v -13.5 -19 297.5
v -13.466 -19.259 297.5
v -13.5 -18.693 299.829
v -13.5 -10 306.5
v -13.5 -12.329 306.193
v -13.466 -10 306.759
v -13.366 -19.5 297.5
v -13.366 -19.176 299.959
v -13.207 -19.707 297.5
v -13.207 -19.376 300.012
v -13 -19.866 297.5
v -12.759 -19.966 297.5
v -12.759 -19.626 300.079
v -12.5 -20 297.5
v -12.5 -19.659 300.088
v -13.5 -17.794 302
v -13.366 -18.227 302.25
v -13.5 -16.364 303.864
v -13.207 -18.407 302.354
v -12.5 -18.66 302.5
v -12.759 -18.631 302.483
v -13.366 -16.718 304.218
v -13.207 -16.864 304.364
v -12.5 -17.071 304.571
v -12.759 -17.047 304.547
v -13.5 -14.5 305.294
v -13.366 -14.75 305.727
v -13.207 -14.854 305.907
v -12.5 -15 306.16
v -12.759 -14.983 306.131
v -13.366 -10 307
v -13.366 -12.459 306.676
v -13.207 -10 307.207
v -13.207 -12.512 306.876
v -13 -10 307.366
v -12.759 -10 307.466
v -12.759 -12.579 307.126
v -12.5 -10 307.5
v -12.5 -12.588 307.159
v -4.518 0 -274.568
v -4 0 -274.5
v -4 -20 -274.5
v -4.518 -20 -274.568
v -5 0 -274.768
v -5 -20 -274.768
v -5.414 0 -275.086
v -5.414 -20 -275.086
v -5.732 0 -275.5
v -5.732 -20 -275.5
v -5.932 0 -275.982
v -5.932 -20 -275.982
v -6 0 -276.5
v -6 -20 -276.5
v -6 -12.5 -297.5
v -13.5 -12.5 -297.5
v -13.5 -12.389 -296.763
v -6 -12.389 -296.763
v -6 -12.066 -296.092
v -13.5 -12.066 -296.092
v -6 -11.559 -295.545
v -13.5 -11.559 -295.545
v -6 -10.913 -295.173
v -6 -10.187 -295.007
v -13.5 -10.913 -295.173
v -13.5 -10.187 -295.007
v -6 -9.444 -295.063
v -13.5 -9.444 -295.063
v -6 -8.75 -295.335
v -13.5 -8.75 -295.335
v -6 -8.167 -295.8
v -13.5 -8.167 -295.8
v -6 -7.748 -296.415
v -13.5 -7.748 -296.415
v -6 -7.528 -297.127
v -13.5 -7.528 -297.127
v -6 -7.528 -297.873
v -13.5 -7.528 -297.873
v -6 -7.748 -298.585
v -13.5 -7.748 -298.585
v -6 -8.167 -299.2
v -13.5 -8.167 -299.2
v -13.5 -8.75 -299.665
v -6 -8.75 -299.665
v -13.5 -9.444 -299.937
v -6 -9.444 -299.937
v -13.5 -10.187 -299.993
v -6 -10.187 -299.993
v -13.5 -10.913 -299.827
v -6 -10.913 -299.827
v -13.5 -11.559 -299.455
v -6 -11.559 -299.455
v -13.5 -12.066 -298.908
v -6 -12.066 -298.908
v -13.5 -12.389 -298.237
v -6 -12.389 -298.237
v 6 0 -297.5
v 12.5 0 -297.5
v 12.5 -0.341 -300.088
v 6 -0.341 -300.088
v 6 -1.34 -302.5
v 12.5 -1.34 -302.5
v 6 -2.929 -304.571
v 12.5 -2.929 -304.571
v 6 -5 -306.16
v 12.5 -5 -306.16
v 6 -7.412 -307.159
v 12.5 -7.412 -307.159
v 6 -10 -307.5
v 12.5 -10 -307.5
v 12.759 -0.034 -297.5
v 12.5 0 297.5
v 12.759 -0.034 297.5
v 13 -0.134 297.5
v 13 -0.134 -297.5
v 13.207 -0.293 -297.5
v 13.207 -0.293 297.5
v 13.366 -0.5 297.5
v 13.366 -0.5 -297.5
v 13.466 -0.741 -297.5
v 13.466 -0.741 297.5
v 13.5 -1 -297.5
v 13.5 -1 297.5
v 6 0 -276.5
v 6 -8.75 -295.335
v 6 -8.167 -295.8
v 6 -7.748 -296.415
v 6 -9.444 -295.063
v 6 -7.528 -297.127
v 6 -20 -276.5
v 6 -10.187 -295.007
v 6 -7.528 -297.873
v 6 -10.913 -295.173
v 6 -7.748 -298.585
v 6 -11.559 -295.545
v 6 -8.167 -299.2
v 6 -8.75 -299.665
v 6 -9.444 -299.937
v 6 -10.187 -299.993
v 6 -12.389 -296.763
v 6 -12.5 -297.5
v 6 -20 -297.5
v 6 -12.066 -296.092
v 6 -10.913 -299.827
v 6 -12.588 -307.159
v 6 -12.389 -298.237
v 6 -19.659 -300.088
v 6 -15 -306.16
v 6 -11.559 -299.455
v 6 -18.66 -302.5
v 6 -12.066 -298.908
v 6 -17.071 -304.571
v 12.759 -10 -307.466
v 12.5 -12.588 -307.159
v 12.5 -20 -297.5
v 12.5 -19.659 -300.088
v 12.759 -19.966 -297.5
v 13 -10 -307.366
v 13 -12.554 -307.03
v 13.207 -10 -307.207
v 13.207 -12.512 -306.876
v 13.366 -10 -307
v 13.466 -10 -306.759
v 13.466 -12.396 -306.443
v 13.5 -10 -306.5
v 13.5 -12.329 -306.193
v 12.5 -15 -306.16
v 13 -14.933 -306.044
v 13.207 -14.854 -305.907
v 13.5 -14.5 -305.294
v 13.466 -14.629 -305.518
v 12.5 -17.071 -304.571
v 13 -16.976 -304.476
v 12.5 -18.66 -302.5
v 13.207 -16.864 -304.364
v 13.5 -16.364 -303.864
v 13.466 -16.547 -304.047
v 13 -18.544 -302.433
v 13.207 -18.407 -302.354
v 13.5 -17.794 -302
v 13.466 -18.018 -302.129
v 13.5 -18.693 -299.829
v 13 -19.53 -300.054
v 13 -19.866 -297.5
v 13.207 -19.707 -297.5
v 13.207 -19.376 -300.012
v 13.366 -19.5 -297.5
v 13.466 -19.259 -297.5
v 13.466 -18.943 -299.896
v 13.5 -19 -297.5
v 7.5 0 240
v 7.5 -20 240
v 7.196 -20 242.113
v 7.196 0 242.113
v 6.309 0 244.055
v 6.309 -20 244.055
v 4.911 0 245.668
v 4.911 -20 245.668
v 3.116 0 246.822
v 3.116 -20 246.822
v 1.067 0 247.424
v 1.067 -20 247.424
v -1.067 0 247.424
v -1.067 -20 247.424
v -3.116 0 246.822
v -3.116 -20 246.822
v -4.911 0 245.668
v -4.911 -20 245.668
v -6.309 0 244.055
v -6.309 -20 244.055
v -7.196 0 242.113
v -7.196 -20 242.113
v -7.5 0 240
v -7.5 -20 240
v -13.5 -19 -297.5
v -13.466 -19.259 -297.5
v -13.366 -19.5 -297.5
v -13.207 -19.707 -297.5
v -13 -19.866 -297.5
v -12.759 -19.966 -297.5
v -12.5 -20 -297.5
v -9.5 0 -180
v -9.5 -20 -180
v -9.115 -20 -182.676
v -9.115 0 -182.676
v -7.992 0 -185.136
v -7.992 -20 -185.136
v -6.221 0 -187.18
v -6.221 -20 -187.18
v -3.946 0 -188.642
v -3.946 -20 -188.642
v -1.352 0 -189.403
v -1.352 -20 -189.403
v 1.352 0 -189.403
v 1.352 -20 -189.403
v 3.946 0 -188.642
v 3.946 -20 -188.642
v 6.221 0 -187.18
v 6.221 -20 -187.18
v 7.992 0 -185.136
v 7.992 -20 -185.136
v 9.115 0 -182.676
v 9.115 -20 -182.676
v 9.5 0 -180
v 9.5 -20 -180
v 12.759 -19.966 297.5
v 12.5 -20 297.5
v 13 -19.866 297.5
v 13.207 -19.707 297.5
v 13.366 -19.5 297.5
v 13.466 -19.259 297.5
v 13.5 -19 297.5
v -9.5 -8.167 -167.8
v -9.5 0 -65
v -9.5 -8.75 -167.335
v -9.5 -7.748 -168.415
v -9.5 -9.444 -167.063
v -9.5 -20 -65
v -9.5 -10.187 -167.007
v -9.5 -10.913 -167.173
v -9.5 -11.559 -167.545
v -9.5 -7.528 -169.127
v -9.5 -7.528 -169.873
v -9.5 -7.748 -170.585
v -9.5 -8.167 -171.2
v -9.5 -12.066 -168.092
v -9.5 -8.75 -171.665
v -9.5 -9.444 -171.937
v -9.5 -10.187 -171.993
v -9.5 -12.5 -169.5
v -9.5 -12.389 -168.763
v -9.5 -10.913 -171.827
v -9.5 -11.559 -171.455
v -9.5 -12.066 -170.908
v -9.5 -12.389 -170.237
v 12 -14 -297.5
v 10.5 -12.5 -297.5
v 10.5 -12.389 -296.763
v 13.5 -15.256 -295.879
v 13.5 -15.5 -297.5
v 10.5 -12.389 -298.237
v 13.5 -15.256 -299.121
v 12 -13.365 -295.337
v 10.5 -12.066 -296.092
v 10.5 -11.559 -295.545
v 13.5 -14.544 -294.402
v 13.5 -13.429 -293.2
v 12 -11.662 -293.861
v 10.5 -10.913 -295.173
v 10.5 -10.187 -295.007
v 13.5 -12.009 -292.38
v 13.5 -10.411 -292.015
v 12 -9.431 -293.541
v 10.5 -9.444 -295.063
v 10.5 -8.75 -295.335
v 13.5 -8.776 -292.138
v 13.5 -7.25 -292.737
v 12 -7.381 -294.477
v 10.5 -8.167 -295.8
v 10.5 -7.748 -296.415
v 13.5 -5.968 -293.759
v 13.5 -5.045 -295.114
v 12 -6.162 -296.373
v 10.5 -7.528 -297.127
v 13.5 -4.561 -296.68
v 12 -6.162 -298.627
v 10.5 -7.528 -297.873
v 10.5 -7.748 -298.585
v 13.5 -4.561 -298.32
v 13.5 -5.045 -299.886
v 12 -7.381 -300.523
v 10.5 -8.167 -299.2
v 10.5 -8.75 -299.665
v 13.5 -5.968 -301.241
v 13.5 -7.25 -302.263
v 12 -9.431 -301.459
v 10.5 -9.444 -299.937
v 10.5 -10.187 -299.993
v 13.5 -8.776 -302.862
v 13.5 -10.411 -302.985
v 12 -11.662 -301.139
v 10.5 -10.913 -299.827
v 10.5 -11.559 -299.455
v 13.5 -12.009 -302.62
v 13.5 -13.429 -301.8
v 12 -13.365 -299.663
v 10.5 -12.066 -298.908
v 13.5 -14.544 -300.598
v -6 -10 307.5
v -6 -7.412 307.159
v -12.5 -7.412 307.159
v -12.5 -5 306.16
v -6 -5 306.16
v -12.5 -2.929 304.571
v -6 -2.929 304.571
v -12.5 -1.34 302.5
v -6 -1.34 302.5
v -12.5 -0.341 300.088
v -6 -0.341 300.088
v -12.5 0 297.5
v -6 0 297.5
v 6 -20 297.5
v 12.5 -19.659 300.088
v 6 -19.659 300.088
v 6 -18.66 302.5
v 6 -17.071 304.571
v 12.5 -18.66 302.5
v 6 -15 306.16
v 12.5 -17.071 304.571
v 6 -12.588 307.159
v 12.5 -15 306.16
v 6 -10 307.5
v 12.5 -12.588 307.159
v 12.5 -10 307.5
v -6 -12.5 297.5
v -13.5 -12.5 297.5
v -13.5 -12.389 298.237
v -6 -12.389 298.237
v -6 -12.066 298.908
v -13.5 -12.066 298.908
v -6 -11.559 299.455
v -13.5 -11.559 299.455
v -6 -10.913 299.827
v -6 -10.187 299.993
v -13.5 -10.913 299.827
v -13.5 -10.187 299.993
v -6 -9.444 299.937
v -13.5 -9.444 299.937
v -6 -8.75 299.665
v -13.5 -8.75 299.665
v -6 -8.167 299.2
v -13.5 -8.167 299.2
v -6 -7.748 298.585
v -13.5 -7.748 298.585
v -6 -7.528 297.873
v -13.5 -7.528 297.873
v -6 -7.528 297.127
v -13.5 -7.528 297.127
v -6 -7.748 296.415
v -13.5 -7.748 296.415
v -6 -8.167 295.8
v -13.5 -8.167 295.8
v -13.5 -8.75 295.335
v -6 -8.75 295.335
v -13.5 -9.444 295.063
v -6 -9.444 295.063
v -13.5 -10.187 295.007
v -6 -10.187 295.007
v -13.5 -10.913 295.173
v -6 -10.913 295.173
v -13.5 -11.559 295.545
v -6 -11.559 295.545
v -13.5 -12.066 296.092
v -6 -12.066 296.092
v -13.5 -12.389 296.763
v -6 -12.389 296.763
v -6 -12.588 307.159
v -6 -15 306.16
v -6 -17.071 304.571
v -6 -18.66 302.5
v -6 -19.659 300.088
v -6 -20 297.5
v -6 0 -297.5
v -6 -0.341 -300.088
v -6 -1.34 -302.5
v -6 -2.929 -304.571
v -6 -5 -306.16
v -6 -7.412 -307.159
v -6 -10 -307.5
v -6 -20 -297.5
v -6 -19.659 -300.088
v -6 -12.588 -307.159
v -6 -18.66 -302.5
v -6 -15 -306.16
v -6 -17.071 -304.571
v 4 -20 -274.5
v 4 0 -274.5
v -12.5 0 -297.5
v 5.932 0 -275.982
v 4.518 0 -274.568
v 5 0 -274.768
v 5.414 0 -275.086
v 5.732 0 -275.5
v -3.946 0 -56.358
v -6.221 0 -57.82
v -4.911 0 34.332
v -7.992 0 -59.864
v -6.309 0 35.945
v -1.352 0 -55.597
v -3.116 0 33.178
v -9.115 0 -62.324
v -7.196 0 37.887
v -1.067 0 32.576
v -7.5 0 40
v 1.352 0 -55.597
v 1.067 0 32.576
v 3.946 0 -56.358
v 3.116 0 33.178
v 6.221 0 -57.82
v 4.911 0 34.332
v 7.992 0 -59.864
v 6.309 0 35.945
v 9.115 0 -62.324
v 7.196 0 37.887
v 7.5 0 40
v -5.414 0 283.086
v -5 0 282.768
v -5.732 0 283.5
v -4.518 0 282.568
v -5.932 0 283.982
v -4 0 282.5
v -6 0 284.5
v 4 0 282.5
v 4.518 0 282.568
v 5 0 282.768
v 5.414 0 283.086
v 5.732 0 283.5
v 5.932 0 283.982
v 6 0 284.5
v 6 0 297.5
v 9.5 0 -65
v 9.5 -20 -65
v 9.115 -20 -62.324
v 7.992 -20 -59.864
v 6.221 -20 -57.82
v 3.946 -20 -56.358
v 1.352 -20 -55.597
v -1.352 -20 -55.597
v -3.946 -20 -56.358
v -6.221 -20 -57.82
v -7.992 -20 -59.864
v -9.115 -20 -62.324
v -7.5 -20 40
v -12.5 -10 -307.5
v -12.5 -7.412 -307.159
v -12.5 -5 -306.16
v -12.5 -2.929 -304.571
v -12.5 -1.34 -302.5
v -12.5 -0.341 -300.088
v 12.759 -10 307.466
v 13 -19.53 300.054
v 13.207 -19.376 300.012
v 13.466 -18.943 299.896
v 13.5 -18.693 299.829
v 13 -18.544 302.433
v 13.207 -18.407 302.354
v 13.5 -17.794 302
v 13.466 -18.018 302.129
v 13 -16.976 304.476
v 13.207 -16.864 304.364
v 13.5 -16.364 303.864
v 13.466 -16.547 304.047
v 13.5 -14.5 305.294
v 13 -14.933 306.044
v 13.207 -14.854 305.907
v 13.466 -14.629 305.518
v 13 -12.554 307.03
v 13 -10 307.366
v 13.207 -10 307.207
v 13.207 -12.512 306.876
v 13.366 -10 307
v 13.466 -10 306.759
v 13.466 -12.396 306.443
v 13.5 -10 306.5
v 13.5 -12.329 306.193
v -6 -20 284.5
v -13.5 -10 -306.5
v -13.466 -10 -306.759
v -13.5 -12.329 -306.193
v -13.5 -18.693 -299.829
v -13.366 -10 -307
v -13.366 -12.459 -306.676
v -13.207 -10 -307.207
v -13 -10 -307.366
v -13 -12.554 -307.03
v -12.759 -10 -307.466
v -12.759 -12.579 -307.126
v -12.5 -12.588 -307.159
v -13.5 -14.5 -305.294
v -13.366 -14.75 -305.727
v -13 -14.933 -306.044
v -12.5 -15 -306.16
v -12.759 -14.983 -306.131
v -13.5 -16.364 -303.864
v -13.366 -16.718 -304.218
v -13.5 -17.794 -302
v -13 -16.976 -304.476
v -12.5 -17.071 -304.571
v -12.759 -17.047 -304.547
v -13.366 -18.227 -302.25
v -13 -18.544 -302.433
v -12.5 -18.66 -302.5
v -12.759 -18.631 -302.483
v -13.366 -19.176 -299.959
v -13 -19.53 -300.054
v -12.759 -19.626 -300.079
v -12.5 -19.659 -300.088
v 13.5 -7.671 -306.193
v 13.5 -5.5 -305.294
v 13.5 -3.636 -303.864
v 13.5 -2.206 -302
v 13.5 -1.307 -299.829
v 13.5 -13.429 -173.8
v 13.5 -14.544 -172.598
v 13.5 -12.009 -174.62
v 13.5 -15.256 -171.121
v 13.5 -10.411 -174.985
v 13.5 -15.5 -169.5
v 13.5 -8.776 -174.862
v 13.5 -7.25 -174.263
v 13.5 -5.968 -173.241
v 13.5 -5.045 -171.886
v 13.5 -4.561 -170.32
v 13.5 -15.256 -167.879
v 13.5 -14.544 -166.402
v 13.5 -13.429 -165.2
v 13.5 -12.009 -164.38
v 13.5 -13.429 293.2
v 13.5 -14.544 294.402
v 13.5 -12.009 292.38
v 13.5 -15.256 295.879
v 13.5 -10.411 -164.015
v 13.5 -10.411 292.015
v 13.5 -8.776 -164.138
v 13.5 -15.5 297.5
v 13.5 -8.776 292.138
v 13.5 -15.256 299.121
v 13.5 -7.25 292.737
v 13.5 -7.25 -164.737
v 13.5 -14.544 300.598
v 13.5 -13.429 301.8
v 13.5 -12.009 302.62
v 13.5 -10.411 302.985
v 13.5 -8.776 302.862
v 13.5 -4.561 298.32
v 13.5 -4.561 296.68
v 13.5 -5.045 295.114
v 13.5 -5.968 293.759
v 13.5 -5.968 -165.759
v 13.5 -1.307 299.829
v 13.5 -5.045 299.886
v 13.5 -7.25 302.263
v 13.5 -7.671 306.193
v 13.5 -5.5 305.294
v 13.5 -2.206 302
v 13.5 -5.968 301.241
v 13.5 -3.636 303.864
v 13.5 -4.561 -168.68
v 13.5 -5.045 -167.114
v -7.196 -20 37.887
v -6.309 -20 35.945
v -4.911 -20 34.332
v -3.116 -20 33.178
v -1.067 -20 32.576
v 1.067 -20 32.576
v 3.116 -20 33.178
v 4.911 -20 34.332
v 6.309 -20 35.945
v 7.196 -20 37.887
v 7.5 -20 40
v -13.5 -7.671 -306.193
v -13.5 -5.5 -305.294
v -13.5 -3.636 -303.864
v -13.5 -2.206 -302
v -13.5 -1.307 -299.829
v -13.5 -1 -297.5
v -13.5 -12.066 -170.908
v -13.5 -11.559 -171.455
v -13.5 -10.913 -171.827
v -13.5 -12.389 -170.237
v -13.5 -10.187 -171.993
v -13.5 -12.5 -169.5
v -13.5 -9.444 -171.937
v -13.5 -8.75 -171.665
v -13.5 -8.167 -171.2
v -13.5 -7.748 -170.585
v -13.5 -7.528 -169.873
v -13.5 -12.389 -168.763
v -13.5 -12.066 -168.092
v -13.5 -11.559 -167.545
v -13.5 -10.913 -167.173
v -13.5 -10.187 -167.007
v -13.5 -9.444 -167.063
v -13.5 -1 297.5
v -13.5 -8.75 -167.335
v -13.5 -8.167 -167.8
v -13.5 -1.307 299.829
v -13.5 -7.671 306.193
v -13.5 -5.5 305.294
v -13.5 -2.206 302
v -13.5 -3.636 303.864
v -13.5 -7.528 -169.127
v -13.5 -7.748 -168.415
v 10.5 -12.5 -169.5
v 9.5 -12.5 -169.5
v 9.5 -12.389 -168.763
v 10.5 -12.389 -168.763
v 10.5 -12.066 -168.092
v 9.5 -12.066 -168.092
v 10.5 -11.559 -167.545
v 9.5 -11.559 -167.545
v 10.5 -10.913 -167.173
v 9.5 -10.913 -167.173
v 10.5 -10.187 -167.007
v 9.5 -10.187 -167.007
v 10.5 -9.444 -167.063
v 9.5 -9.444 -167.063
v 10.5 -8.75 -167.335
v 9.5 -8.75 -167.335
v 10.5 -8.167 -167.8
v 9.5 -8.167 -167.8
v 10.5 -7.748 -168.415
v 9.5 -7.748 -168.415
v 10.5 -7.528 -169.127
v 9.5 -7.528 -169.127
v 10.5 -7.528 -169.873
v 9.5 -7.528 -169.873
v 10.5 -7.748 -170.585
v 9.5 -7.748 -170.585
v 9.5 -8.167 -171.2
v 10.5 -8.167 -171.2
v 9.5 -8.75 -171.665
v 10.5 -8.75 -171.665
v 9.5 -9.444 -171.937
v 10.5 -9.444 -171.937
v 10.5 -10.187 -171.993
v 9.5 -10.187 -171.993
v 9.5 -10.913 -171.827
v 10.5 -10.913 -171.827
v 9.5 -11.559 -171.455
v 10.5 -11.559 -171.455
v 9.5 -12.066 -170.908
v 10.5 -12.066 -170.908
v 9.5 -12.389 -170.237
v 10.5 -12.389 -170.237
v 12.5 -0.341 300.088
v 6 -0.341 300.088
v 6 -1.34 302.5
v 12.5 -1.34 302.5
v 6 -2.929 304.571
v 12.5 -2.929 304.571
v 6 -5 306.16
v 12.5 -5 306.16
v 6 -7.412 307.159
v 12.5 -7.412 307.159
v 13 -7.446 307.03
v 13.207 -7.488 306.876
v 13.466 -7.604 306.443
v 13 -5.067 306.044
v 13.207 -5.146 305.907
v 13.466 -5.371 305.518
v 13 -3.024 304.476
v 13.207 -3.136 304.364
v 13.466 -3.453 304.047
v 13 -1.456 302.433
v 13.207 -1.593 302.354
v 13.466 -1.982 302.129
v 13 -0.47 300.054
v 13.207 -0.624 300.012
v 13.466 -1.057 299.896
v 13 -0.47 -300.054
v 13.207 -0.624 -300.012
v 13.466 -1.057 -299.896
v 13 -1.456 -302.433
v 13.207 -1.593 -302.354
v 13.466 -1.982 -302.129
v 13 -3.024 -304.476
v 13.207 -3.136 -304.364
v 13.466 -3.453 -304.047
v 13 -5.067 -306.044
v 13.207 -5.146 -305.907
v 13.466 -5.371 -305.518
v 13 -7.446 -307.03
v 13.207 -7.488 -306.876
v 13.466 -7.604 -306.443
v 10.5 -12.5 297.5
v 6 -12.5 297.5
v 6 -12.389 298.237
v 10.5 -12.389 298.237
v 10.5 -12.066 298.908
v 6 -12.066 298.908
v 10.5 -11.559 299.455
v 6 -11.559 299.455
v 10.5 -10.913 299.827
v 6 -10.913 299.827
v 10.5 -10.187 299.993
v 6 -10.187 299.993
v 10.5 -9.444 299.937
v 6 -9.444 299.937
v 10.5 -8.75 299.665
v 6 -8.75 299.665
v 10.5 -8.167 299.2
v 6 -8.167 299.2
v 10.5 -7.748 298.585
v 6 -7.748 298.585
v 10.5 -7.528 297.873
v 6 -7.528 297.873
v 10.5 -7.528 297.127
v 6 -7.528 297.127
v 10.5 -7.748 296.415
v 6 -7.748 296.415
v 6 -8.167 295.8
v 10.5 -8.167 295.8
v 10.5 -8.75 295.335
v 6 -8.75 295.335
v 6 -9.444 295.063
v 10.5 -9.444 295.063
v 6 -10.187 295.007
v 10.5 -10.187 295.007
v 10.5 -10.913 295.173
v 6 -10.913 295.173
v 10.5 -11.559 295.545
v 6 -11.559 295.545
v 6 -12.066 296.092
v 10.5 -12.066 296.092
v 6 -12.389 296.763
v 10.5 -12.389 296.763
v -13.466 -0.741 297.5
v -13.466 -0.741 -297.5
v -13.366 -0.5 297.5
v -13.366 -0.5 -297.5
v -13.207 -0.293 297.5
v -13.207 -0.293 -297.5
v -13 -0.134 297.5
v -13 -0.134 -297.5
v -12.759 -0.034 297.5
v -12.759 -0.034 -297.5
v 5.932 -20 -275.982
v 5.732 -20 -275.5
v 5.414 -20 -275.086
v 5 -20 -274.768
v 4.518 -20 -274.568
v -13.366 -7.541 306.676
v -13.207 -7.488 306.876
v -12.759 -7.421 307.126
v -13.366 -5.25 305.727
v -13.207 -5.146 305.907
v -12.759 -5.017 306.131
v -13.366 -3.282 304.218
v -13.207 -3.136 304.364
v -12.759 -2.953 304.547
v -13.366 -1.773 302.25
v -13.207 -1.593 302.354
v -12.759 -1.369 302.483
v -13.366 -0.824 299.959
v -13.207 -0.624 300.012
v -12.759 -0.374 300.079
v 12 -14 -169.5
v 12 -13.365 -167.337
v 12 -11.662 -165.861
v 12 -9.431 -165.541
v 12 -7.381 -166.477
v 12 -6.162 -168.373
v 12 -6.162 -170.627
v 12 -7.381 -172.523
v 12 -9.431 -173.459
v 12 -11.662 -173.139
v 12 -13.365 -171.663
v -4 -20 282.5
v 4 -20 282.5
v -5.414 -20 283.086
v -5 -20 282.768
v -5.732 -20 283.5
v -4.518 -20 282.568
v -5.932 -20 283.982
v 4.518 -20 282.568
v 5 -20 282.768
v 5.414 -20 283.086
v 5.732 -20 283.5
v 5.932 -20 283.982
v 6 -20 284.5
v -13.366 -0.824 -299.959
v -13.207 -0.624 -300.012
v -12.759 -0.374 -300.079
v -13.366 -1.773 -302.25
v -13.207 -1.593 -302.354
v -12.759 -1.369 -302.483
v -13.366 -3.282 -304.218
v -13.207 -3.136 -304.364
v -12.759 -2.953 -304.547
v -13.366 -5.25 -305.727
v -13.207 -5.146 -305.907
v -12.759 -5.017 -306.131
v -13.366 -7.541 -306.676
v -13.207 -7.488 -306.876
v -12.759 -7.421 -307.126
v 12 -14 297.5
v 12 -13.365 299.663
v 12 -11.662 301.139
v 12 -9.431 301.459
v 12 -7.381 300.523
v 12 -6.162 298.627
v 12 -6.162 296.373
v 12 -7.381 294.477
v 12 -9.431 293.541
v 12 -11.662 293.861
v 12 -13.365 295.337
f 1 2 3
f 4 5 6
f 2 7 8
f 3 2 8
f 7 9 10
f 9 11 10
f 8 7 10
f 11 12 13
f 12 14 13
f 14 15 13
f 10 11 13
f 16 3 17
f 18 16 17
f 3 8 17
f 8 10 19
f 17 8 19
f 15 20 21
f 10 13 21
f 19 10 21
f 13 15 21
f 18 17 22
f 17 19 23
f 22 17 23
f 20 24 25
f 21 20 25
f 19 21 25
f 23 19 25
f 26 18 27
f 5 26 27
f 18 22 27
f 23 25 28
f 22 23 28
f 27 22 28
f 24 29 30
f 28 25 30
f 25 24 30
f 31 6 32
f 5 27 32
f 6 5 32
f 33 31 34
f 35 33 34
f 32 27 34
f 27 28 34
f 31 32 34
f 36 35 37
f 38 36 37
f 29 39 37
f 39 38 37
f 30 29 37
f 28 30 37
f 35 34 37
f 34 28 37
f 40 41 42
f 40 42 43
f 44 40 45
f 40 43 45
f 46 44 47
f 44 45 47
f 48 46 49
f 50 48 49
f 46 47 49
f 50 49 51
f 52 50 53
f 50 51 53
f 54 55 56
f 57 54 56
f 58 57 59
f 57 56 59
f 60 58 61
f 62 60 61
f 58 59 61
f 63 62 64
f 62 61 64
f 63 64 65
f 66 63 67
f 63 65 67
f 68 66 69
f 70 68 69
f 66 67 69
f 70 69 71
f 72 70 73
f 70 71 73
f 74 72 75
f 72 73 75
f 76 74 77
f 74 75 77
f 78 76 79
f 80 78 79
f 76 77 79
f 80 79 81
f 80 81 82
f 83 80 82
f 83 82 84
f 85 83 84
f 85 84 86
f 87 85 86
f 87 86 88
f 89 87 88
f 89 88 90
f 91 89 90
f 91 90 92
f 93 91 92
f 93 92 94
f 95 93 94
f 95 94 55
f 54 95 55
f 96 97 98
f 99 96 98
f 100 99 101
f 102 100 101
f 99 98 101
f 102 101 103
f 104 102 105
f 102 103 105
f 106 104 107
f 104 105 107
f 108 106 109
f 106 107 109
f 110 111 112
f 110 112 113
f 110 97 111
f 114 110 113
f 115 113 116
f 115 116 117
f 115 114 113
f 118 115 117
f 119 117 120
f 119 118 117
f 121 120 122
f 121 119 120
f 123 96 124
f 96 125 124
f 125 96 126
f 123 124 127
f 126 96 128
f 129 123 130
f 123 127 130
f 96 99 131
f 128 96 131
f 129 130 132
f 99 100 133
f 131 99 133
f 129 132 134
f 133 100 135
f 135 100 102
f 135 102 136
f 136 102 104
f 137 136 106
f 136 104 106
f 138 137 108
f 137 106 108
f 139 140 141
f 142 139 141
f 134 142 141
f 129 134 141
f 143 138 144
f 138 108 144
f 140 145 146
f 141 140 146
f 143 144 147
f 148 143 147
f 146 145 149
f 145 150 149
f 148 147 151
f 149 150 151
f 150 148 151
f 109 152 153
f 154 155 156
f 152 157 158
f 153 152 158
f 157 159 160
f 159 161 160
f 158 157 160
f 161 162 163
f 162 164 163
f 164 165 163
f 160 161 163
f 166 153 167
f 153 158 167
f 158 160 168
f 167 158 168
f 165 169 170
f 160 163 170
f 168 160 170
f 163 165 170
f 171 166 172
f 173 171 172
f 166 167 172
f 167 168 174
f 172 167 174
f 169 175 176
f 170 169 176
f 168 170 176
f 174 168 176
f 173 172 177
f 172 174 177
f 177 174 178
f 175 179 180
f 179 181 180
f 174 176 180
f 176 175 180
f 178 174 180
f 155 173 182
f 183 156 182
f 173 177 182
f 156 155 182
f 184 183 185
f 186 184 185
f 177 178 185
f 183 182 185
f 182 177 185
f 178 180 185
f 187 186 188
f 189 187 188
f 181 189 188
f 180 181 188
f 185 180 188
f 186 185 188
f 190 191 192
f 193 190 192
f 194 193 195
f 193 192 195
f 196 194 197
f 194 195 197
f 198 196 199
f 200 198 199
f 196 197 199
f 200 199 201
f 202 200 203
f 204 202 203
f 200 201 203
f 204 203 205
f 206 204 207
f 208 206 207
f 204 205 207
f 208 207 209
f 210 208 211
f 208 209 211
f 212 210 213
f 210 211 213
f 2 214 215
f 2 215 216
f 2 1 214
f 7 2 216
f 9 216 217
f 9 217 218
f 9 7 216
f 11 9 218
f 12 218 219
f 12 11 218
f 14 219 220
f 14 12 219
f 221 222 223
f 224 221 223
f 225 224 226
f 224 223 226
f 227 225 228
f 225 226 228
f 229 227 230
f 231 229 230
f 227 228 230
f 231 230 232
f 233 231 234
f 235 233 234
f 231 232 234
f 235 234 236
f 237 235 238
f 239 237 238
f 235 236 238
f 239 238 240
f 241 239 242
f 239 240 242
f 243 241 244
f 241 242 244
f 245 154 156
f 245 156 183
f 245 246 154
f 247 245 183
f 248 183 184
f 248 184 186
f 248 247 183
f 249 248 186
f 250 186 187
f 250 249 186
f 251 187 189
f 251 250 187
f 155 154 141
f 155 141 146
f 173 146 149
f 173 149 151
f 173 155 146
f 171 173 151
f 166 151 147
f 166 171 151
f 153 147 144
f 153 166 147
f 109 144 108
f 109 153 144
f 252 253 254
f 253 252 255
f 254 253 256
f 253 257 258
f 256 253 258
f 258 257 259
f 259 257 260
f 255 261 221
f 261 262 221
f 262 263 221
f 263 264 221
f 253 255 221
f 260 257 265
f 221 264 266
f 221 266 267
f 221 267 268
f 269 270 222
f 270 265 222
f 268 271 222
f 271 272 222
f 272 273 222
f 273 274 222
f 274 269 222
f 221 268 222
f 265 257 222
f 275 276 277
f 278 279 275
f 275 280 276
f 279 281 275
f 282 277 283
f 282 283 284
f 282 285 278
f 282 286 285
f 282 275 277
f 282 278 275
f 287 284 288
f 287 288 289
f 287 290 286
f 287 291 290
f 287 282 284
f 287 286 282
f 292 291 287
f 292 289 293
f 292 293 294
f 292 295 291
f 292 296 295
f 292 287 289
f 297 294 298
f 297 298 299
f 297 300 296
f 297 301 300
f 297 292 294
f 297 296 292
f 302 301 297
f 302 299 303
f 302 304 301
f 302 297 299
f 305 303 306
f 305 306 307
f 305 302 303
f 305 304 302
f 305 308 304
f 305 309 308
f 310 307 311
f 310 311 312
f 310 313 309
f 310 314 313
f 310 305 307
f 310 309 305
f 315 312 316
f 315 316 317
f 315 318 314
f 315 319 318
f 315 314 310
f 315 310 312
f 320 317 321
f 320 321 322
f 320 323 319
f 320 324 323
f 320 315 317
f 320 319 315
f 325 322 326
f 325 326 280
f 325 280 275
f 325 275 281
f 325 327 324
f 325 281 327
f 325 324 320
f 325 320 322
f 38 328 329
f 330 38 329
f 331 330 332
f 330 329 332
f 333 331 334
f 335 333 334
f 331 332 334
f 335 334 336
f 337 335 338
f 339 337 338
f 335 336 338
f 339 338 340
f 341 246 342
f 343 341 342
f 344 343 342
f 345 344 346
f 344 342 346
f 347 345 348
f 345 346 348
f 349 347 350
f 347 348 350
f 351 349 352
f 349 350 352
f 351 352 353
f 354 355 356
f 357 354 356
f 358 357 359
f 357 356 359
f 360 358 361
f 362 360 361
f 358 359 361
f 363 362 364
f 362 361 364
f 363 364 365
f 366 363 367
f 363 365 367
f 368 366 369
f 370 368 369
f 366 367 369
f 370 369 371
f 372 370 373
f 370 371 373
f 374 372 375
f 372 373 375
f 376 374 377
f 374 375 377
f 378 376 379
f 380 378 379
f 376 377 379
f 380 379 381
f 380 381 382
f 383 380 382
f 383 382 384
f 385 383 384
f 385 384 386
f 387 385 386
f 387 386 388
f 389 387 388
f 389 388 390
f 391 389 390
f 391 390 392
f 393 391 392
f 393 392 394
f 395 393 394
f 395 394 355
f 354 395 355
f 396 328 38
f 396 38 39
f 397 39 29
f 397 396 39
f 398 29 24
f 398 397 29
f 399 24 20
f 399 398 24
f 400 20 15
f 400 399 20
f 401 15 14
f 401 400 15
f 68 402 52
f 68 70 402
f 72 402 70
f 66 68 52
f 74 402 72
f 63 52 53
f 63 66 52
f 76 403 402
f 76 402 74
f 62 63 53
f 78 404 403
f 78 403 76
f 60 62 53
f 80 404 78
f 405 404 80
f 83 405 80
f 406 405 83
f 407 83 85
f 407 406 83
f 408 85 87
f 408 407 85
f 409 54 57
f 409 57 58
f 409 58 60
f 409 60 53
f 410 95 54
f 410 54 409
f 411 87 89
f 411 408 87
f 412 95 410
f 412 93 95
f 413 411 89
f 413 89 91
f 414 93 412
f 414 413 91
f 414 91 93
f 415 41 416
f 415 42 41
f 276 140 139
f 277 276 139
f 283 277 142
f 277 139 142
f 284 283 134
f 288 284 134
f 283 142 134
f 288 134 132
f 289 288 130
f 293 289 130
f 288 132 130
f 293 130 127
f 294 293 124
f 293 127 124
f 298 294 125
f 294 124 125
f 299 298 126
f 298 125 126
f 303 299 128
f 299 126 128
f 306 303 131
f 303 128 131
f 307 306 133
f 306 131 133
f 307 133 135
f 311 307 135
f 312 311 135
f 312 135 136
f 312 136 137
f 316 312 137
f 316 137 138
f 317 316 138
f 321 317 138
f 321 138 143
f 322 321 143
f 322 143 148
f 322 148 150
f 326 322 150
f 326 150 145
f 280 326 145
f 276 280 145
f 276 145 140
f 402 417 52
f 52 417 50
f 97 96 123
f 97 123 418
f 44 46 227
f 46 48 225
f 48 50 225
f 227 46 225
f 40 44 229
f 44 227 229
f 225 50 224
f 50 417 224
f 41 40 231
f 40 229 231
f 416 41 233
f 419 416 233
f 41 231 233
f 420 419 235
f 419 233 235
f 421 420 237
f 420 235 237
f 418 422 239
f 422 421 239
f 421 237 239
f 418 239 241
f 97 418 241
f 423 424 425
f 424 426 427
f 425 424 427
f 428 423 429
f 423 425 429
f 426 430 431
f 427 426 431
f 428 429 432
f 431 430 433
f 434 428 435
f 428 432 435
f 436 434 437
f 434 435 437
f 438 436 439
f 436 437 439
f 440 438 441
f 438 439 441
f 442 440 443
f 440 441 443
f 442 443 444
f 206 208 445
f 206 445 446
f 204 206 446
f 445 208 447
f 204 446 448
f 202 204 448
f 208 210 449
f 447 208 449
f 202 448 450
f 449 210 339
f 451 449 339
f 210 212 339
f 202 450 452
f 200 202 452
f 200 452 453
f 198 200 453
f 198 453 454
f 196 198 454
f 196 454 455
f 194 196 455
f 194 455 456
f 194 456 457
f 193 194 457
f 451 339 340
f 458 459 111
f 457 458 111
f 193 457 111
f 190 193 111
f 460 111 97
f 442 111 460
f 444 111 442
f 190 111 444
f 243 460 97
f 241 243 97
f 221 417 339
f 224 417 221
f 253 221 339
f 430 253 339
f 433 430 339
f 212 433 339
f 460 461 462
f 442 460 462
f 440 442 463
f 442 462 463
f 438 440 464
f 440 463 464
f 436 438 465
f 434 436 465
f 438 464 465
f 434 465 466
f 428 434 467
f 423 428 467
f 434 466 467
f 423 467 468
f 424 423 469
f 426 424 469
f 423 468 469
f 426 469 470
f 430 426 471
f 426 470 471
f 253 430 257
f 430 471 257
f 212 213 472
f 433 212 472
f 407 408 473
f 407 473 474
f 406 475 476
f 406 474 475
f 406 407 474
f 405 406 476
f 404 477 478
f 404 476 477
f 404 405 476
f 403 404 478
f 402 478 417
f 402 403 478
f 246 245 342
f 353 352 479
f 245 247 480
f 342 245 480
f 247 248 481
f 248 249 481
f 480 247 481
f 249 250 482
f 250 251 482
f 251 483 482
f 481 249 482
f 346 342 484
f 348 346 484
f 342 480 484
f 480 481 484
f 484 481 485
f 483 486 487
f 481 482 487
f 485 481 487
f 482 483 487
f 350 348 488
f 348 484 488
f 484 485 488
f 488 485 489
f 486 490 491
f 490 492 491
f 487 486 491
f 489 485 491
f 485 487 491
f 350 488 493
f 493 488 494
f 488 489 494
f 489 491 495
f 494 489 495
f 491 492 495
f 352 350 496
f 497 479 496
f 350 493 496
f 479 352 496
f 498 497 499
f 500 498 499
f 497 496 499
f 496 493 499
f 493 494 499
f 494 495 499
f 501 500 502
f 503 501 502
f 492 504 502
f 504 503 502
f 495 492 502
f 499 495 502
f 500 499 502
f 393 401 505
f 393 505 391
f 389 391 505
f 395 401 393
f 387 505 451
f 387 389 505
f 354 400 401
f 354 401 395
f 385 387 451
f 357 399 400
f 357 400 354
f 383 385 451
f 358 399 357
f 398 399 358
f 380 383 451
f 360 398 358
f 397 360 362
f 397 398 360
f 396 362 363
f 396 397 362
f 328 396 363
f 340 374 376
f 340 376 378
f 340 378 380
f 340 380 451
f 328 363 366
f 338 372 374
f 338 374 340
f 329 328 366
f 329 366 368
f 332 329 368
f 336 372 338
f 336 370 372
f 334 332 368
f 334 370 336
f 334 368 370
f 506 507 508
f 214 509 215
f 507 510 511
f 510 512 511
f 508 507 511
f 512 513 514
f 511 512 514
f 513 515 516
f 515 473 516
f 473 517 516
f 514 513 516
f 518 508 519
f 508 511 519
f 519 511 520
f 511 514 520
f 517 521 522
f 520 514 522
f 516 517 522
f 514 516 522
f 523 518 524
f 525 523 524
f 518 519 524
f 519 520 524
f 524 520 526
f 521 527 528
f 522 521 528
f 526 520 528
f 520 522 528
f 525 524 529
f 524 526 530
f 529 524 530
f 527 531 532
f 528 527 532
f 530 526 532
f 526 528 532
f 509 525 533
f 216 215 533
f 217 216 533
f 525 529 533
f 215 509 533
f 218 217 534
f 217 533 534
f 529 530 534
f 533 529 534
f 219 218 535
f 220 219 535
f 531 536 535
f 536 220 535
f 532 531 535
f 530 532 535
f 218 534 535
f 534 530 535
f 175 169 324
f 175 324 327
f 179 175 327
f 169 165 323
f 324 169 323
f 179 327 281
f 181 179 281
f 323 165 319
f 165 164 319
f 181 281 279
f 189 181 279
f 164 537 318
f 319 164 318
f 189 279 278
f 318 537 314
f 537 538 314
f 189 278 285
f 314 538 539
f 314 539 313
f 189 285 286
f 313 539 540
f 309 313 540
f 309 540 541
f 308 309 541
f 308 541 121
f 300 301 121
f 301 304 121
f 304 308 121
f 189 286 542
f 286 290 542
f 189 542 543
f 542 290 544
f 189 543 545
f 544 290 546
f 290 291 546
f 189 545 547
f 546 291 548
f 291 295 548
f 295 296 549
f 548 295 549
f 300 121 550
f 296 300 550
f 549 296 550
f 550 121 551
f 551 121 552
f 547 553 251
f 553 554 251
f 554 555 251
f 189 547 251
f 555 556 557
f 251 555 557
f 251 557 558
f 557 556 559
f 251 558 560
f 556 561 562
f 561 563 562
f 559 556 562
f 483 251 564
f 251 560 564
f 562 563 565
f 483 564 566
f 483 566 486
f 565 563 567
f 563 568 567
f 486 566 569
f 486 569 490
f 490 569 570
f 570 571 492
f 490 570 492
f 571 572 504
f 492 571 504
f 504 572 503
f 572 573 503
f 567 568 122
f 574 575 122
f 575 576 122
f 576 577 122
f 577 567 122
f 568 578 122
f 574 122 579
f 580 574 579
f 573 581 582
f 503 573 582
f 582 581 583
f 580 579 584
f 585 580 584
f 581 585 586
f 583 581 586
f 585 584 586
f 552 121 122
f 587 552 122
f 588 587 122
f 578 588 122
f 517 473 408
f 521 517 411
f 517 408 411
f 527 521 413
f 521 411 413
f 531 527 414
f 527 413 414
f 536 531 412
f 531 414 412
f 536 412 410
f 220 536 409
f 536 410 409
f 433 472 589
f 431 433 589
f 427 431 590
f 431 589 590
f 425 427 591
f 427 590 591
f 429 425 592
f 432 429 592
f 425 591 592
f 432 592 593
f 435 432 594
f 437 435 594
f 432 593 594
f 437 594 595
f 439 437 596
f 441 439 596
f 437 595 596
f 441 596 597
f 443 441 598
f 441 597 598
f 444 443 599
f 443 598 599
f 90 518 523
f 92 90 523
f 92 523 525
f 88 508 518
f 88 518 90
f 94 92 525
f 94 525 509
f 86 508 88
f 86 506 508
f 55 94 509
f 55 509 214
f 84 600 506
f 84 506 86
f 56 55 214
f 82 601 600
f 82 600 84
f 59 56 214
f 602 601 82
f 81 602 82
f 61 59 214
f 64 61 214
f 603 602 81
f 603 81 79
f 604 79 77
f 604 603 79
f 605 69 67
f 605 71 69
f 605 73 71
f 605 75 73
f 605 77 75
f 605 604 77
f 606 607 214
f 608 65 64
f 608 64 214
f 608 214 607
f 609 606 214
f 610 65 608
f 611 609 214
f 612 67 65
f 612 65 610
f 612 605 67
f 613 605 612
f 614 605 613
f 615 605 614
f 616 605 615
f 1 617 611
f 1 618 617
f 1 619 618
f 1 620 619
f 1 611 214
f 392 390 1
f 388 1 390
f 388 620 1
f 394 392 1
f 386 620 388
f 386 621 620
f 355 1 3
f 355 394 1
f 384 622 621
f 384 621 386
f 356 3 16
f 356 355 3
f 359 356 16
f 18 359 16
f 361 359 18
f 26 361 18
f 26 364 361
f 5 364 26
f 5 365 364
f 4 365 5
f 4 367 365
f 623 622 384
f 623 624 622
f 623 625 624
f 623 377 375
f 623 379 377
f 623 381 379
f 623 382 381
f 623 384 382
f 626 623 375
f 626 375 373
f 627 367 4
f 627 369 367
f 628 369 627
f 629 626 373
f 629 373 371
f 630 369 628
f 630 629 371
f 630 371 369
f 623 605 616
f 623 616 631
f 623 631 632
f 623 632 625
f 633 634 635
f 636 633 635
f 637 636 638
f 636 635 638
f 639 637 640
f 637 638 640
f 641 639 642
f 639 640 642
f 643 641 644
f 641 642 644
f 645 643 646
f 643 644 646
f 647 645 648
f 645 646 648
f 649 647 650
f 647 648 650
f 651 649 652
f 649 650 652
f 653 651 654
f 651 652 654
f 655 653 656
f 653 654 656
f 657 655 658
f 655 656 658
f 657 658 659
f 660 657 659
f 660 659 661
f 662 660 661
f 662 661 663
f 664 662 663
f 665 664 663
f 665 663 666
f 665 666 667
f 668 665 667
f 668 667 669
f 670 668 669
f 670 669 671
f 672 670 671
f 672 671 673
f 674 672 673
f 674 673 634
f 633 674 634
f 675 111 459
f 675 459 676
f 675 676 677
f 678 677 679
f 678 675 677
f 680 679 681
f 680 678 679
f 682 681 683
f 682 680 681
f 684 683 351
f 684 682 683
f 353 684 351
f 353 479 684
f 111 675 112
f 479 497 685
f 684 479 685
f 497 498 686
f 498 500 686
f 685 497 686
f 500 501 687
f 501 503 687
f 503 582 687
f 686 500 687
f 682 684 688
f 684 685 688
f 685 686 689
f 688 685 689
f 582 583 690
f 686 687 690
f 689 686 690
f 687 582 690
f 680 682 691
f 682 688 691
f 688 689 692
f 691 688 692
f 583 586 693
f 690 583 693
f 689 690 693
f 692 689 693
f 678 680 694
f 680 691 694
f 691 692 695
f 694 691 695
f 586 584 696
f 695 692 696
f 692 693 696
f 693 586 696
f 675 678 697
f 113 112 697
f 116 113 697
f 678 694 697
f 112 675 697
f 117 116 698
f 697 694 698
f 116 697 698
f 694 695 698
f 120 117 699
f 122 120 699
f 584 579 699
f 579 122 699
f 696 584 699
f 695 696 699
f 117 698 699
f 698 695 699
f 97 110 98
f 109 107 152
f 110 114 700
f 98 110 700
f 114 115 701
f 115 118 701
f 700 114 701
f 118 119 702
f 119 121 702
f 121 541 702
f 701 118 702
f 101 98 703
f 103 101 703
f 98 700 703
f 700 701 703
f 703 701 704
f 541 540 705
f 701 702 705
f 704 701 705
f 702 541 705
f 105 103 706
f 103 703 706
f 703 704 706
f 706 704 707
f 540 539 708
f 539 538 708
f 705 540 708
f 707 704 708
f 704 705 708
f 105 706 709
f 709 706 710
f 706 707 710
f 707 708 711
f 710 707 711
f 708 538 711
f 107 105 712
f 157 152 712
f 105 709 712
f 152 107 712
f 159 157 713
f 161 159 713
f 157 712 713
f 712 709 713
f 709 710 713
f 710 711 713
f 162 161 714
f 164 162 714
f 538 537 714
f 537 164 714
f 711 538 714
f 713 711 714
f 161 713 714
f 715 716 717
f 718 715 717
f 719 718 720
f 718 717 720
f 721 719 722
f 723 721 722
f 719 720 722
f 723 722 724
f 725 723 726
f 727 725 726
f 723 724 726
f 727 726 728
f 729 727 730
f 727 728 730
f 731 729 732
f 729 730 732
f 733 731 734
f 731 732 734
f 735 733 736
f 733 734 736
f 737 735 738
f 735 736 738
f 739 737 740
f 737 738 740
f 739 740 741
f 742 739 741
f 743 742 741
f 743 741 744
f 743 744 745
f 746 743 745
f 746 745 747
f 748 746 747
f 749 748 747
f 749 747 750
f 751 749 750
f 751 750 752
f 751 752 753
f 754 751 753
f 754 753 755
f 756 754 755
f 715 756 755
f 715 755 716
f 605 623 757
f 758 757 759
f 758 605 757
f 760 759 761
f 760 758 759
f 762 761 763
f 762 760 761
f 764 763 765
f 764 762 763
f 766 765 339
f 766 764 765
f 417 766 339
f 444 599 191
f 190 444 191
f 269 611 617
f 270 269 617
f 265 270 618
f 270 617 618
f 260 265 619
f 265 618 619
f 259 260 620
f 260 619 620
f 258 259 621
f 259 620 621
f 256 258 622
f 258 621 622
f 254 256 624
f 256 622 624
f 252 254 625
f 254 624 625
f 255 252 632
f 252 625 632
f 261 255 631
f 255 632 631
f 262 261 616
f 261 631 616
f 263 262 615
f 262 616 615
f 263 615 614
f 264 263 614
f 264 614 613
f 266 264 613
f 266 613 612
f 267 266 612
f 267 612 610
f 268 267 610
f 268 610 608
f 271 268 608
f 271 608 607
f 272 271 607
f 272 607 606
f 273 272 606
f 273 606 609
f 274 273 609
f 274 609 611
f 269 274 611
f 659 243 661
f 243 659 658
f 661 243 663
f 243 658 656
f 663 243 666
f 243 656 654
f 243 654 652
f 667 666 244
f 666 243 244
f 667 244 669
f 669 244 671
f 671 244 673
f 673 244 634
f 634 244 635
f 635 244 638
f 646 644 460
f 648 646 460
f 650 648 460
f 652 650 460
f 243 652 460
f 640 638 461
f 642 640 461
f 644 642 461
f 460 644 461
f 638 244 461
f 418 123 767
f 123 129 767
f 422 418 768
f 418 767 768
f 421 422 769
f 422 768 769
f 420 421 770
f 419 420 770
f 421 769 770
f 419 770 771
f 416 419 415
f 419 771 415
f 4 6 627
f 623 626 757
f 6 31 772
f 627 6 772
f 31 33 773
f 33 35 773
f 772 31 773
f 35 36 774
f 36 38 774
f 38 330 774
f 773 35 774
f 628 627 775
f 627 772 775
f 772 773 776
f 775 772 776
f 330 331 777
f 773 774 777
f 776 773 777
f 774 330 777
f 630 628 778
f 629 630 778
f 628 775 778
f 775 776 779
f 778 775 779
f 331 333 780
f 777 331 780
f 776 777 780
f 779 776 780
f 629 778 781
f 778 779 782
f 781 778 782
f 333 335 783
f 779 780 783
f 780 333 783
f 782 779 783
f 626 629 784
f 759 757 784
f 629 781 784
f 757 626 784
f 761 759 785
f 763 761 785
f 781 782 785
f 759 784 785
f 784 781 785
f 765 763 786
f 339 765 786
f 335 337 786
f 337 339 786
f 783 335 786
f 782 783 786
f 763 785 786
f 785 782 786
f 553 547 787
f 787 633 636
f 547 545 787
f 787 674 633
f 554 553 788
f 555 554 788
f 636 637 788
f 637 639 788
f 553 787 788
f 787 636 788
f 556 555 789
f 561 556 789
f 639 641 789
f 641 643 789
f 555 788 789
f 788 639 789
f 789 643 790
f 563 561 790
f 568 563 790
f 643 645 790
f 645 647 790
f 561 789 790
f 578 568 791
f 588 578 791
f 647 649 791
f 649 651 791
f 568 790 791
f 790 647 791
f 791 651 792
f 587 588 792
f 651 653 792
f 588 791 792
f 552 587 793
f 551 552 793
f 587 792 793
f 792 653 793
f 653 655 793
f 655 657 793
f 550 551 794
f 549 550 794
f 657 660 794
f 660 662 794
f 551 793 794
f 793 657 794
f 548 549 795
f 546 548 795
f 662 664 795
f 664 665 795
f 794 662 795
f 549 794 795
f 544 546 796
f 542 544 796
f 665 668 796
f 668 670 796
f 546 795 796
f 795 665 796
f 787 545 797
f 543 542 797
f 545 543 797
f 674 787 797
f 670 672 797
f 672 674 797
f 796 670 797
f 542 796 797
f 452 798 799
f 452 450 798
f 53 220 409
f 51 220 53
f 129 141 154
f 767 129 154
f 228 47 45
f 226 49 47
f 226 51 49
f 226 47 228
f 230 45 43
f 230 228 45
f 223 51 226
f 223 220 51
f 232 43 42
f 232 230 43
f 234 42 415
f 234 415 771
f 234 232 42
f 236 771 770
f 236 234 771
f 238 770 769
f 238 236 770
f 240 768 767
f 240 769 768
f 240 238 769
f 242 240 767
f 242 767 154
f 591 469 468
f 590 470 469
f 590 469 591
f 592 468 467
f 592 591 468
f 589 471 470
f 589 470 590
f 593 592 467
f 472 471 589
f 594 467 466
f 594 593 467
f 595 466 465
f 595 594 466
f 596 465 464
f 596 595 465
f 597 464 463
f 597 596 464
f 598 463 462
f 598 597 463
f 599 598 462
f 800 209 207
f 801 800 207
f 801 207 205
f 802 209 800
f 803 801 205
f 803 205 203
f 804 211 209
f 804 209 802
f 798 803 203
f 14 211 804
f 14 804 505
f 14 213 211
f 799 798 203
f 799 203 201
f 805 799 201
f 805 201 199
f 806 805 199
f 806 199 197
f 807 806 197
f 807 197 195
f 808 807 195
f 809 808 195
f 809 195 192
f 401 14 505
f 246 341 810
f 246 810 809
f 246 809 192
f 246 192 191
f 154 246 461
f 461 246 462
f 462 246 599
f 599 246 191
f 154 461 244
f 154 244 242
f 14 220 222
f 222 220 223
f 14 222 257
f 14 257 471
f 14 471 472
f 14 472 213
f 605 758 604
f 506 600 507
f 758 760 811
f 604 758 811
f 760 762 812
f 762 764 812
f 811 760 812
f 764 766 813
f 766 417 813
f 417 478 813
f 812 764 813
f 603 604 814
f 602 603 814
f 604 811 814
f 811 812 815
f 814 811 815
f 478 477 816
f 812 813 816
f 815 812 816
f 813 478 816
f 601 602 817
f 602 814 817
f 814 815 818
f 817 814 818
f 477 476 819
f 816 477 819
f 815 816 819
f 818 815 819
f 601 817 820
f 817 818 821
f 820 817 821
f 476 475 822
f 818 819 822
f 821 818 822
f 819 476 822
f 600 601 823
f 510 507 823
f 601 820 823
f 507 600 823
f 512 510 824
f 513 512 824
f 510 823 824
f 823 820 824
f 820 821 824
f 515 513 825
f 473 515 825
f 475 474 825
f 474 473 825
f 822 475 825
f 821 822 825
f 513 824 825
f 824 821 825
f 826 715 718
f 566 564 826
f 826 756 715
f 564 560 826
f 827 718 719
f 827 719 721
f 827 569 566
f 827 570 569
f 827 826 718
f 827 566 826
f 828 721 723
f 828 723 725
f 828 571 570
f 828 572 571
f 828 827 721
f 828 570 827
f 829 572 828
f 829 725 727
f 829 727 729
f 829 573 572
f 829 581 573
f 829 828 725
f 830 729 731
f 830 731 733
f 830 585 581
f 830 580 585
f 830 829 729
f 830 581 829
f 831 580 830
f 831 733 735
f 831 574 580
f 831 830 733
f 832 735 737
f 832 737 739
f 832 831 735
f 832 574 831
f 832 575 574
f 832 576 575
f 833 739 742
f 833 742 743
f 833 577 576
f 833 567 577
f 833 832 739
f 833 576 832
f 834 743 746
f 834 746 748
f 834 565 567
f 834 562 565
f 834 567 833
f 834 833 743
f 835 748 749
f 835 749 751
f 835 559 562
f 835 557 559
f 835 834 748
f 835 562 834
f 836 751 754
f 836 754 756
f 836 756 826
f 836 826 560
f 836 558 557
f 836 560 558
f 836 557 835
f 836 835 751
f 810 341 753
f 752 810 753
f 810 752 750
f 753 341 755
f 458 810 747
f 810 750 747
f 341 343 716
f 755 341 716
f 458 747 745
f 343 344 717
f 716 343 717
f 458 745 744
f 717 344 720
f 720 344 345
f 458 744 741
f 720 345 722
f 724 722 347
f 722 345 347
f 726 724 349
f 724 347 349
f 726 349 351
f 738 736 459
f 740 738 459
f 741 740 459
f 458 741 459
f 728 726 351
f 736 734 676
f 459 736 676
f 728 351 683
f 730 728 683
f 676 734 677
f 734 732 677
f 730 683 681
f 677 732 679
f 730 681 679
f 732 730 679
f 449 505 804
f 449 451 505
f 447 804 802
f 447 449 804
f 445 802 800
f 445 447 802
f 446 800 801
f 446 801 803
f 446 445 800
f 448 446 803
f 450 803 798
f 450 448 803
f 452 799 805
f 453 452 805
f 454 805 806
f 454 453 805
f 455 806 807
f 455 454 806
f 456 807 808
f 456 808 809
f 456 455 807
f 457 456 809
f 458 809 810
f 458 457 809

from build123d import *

# Parameters (mm, degrees)
F0_W      = 27
F0_H      = 615
F1_DEPTH  = 20
F2_W      = 12
F2_H      = 20
F3_DEPTH  = 25
F4_W      = 12
F4_H      = 20
F5_DEPTH  = 33
F6_R      = 9.99999
F7_R      = 2.5
F8_DEPTH  = 30
F10_DEPTH = 25
F11_R     = 2.5
F12_DEPTH = 30
F14_DEPTH = 25
F15_R     = 1
F16_SIZE  = 3
F17_R     = 2


# Not quite as in the source:
# - a fillet or chamfer is up to 0.001 mm smaller than in the source, because OpenCascade refuses the exact size


with BuildPart() as f1:
    # F0 (on Front) → F1 (new body)
    with BuildSketch(Plane.XZ):
        Rectangle(F0_W, F0_H)
    extrude(amount=F1_DEPTH)

    # F2 (on face) → F3 (cut)
    with BuildSketch(Plane.XY.offset(307.5)):
        with Locations((0, -10)):
            Rectangle(F2_W, F2_H)
    extrude(amount=-F3_DEPTH, mode=Mode.SUBTRACT)

    # F4 (on face) → F5 (cut)
    with BuildSketch(Plane(origin=(0, 0, -307.5), x_dir=(1, 0, 0), z_dir=(0, 0, -1))):
        with Locations((0, 10)):
            Rectangle(F4_W, F4_H)
    extrude(amount=-F5_DEPTH, mode=Mode.SUBTRACT)

    # F6 (radius 10 in the source; OpenCascade refuses exactly that, so slightly less here)
    f6_edges = [f1.edges().sort_by_distance(p)[0] for p in [
        (-9.75, 0, -307.5),
        (9.75, 0, -307.5),
        (9.75, -20, -307.5),
        (-9.75, -20, -307.5),
        (-9.75, -20, 307.5),
        (-9.75, 0, 307.5),
        (9.75, 0, 307.5),
        (9.75, -20, 307.5),
    ]]
    fillet(f6_edges, radius=F6_R)

    # F7 (on face) → F8 (cut)
    with BuildSketch(Plane(origin=(-13.5, 0, 0), x_dir=(0, -1, 0), z_dir=(-1, 0, 0))):
        with Locations((10, 297.5)):
            Circle(F7_R)
        with Locations((10, -297.5)):
            Circle(F7_R)
    extrude(amount=-F8_DEPTH, mode=Mode.SUBTRACT)

    # F9 (on face) → F10 (cut)
    with BuildSketch(Plane.XZ.offset(20)):
        with BuildLine():
            ThreePointArc((9.5, -65), (0, -55.5), (-9.5, -65))
            Line((-9.5, -65), (-9.5, -180))
            ThreePointArc((-9.5, -180), (0, -189.5), (9.5, -180))
            Line((9.5, -180), (9.5, -65))
        make_face()
    extrude(amount=-F10_DEPTH, mode=Mode.SUBTRACT)

    # F11 (on face) → F12 (cut)
    with BuildSketch(Plane(origin=(-13.5, 0, 0), x_dir=(0, -1, 0), z_dir=(-1, 0, 0))):
        with Locations((10, -169.5)):
            Circle(F11_R)
    extrude(amount=-F12_DEPTH, mode=Mode.SUBTRACT)

    # F13 (on face) → F14 (cut)
    with BuildSketch(Plane.XZ.offset(20)):
        with BuildLine():
            ThreePointArc((7.5, 240), (0, 247.5), (-7.5, 240))
            Line((-7.5, 240), (-7.5, 40))
            ThreePointArc((-7.5, 40), (0, 32.5), (7.5, 40))
            Line((7.5, 40), (7.5, 240))
        make_face()
    extrude(amount=-F14_DEPTH, mode=Mode.SUBTRACT)

    # F15
    f15_edges = [f1.edges().sort_by_distance(p)[0] for p in [
        (13.5, -20, 0),
        (-13.5, -20, 0),
    ]]
    fillet(f15_edges, radius=F15_R)

    # F16
    f16_edges = [f1.edges().sort_by_distance(p)[0] for p in [
        (13.5, -7.5, 297.5),
        (13.5, -7.5, -169.5),
        (13.5, -7.5, -297.5),
    ]]
    chamfer(f16_edges, length=F16_SIZE)

    # F17
    f17_edges = [f1.edges().sort_by_distance(p)[0] for p in [
        (-6, -10, 282.5),
        (6, -10, 282.5),
        (6, -10, -274.5),
        (-6, -10, -274.5),
    ]]
    fillet(f17_edges, radius=F17_R)


solid = f1.part
